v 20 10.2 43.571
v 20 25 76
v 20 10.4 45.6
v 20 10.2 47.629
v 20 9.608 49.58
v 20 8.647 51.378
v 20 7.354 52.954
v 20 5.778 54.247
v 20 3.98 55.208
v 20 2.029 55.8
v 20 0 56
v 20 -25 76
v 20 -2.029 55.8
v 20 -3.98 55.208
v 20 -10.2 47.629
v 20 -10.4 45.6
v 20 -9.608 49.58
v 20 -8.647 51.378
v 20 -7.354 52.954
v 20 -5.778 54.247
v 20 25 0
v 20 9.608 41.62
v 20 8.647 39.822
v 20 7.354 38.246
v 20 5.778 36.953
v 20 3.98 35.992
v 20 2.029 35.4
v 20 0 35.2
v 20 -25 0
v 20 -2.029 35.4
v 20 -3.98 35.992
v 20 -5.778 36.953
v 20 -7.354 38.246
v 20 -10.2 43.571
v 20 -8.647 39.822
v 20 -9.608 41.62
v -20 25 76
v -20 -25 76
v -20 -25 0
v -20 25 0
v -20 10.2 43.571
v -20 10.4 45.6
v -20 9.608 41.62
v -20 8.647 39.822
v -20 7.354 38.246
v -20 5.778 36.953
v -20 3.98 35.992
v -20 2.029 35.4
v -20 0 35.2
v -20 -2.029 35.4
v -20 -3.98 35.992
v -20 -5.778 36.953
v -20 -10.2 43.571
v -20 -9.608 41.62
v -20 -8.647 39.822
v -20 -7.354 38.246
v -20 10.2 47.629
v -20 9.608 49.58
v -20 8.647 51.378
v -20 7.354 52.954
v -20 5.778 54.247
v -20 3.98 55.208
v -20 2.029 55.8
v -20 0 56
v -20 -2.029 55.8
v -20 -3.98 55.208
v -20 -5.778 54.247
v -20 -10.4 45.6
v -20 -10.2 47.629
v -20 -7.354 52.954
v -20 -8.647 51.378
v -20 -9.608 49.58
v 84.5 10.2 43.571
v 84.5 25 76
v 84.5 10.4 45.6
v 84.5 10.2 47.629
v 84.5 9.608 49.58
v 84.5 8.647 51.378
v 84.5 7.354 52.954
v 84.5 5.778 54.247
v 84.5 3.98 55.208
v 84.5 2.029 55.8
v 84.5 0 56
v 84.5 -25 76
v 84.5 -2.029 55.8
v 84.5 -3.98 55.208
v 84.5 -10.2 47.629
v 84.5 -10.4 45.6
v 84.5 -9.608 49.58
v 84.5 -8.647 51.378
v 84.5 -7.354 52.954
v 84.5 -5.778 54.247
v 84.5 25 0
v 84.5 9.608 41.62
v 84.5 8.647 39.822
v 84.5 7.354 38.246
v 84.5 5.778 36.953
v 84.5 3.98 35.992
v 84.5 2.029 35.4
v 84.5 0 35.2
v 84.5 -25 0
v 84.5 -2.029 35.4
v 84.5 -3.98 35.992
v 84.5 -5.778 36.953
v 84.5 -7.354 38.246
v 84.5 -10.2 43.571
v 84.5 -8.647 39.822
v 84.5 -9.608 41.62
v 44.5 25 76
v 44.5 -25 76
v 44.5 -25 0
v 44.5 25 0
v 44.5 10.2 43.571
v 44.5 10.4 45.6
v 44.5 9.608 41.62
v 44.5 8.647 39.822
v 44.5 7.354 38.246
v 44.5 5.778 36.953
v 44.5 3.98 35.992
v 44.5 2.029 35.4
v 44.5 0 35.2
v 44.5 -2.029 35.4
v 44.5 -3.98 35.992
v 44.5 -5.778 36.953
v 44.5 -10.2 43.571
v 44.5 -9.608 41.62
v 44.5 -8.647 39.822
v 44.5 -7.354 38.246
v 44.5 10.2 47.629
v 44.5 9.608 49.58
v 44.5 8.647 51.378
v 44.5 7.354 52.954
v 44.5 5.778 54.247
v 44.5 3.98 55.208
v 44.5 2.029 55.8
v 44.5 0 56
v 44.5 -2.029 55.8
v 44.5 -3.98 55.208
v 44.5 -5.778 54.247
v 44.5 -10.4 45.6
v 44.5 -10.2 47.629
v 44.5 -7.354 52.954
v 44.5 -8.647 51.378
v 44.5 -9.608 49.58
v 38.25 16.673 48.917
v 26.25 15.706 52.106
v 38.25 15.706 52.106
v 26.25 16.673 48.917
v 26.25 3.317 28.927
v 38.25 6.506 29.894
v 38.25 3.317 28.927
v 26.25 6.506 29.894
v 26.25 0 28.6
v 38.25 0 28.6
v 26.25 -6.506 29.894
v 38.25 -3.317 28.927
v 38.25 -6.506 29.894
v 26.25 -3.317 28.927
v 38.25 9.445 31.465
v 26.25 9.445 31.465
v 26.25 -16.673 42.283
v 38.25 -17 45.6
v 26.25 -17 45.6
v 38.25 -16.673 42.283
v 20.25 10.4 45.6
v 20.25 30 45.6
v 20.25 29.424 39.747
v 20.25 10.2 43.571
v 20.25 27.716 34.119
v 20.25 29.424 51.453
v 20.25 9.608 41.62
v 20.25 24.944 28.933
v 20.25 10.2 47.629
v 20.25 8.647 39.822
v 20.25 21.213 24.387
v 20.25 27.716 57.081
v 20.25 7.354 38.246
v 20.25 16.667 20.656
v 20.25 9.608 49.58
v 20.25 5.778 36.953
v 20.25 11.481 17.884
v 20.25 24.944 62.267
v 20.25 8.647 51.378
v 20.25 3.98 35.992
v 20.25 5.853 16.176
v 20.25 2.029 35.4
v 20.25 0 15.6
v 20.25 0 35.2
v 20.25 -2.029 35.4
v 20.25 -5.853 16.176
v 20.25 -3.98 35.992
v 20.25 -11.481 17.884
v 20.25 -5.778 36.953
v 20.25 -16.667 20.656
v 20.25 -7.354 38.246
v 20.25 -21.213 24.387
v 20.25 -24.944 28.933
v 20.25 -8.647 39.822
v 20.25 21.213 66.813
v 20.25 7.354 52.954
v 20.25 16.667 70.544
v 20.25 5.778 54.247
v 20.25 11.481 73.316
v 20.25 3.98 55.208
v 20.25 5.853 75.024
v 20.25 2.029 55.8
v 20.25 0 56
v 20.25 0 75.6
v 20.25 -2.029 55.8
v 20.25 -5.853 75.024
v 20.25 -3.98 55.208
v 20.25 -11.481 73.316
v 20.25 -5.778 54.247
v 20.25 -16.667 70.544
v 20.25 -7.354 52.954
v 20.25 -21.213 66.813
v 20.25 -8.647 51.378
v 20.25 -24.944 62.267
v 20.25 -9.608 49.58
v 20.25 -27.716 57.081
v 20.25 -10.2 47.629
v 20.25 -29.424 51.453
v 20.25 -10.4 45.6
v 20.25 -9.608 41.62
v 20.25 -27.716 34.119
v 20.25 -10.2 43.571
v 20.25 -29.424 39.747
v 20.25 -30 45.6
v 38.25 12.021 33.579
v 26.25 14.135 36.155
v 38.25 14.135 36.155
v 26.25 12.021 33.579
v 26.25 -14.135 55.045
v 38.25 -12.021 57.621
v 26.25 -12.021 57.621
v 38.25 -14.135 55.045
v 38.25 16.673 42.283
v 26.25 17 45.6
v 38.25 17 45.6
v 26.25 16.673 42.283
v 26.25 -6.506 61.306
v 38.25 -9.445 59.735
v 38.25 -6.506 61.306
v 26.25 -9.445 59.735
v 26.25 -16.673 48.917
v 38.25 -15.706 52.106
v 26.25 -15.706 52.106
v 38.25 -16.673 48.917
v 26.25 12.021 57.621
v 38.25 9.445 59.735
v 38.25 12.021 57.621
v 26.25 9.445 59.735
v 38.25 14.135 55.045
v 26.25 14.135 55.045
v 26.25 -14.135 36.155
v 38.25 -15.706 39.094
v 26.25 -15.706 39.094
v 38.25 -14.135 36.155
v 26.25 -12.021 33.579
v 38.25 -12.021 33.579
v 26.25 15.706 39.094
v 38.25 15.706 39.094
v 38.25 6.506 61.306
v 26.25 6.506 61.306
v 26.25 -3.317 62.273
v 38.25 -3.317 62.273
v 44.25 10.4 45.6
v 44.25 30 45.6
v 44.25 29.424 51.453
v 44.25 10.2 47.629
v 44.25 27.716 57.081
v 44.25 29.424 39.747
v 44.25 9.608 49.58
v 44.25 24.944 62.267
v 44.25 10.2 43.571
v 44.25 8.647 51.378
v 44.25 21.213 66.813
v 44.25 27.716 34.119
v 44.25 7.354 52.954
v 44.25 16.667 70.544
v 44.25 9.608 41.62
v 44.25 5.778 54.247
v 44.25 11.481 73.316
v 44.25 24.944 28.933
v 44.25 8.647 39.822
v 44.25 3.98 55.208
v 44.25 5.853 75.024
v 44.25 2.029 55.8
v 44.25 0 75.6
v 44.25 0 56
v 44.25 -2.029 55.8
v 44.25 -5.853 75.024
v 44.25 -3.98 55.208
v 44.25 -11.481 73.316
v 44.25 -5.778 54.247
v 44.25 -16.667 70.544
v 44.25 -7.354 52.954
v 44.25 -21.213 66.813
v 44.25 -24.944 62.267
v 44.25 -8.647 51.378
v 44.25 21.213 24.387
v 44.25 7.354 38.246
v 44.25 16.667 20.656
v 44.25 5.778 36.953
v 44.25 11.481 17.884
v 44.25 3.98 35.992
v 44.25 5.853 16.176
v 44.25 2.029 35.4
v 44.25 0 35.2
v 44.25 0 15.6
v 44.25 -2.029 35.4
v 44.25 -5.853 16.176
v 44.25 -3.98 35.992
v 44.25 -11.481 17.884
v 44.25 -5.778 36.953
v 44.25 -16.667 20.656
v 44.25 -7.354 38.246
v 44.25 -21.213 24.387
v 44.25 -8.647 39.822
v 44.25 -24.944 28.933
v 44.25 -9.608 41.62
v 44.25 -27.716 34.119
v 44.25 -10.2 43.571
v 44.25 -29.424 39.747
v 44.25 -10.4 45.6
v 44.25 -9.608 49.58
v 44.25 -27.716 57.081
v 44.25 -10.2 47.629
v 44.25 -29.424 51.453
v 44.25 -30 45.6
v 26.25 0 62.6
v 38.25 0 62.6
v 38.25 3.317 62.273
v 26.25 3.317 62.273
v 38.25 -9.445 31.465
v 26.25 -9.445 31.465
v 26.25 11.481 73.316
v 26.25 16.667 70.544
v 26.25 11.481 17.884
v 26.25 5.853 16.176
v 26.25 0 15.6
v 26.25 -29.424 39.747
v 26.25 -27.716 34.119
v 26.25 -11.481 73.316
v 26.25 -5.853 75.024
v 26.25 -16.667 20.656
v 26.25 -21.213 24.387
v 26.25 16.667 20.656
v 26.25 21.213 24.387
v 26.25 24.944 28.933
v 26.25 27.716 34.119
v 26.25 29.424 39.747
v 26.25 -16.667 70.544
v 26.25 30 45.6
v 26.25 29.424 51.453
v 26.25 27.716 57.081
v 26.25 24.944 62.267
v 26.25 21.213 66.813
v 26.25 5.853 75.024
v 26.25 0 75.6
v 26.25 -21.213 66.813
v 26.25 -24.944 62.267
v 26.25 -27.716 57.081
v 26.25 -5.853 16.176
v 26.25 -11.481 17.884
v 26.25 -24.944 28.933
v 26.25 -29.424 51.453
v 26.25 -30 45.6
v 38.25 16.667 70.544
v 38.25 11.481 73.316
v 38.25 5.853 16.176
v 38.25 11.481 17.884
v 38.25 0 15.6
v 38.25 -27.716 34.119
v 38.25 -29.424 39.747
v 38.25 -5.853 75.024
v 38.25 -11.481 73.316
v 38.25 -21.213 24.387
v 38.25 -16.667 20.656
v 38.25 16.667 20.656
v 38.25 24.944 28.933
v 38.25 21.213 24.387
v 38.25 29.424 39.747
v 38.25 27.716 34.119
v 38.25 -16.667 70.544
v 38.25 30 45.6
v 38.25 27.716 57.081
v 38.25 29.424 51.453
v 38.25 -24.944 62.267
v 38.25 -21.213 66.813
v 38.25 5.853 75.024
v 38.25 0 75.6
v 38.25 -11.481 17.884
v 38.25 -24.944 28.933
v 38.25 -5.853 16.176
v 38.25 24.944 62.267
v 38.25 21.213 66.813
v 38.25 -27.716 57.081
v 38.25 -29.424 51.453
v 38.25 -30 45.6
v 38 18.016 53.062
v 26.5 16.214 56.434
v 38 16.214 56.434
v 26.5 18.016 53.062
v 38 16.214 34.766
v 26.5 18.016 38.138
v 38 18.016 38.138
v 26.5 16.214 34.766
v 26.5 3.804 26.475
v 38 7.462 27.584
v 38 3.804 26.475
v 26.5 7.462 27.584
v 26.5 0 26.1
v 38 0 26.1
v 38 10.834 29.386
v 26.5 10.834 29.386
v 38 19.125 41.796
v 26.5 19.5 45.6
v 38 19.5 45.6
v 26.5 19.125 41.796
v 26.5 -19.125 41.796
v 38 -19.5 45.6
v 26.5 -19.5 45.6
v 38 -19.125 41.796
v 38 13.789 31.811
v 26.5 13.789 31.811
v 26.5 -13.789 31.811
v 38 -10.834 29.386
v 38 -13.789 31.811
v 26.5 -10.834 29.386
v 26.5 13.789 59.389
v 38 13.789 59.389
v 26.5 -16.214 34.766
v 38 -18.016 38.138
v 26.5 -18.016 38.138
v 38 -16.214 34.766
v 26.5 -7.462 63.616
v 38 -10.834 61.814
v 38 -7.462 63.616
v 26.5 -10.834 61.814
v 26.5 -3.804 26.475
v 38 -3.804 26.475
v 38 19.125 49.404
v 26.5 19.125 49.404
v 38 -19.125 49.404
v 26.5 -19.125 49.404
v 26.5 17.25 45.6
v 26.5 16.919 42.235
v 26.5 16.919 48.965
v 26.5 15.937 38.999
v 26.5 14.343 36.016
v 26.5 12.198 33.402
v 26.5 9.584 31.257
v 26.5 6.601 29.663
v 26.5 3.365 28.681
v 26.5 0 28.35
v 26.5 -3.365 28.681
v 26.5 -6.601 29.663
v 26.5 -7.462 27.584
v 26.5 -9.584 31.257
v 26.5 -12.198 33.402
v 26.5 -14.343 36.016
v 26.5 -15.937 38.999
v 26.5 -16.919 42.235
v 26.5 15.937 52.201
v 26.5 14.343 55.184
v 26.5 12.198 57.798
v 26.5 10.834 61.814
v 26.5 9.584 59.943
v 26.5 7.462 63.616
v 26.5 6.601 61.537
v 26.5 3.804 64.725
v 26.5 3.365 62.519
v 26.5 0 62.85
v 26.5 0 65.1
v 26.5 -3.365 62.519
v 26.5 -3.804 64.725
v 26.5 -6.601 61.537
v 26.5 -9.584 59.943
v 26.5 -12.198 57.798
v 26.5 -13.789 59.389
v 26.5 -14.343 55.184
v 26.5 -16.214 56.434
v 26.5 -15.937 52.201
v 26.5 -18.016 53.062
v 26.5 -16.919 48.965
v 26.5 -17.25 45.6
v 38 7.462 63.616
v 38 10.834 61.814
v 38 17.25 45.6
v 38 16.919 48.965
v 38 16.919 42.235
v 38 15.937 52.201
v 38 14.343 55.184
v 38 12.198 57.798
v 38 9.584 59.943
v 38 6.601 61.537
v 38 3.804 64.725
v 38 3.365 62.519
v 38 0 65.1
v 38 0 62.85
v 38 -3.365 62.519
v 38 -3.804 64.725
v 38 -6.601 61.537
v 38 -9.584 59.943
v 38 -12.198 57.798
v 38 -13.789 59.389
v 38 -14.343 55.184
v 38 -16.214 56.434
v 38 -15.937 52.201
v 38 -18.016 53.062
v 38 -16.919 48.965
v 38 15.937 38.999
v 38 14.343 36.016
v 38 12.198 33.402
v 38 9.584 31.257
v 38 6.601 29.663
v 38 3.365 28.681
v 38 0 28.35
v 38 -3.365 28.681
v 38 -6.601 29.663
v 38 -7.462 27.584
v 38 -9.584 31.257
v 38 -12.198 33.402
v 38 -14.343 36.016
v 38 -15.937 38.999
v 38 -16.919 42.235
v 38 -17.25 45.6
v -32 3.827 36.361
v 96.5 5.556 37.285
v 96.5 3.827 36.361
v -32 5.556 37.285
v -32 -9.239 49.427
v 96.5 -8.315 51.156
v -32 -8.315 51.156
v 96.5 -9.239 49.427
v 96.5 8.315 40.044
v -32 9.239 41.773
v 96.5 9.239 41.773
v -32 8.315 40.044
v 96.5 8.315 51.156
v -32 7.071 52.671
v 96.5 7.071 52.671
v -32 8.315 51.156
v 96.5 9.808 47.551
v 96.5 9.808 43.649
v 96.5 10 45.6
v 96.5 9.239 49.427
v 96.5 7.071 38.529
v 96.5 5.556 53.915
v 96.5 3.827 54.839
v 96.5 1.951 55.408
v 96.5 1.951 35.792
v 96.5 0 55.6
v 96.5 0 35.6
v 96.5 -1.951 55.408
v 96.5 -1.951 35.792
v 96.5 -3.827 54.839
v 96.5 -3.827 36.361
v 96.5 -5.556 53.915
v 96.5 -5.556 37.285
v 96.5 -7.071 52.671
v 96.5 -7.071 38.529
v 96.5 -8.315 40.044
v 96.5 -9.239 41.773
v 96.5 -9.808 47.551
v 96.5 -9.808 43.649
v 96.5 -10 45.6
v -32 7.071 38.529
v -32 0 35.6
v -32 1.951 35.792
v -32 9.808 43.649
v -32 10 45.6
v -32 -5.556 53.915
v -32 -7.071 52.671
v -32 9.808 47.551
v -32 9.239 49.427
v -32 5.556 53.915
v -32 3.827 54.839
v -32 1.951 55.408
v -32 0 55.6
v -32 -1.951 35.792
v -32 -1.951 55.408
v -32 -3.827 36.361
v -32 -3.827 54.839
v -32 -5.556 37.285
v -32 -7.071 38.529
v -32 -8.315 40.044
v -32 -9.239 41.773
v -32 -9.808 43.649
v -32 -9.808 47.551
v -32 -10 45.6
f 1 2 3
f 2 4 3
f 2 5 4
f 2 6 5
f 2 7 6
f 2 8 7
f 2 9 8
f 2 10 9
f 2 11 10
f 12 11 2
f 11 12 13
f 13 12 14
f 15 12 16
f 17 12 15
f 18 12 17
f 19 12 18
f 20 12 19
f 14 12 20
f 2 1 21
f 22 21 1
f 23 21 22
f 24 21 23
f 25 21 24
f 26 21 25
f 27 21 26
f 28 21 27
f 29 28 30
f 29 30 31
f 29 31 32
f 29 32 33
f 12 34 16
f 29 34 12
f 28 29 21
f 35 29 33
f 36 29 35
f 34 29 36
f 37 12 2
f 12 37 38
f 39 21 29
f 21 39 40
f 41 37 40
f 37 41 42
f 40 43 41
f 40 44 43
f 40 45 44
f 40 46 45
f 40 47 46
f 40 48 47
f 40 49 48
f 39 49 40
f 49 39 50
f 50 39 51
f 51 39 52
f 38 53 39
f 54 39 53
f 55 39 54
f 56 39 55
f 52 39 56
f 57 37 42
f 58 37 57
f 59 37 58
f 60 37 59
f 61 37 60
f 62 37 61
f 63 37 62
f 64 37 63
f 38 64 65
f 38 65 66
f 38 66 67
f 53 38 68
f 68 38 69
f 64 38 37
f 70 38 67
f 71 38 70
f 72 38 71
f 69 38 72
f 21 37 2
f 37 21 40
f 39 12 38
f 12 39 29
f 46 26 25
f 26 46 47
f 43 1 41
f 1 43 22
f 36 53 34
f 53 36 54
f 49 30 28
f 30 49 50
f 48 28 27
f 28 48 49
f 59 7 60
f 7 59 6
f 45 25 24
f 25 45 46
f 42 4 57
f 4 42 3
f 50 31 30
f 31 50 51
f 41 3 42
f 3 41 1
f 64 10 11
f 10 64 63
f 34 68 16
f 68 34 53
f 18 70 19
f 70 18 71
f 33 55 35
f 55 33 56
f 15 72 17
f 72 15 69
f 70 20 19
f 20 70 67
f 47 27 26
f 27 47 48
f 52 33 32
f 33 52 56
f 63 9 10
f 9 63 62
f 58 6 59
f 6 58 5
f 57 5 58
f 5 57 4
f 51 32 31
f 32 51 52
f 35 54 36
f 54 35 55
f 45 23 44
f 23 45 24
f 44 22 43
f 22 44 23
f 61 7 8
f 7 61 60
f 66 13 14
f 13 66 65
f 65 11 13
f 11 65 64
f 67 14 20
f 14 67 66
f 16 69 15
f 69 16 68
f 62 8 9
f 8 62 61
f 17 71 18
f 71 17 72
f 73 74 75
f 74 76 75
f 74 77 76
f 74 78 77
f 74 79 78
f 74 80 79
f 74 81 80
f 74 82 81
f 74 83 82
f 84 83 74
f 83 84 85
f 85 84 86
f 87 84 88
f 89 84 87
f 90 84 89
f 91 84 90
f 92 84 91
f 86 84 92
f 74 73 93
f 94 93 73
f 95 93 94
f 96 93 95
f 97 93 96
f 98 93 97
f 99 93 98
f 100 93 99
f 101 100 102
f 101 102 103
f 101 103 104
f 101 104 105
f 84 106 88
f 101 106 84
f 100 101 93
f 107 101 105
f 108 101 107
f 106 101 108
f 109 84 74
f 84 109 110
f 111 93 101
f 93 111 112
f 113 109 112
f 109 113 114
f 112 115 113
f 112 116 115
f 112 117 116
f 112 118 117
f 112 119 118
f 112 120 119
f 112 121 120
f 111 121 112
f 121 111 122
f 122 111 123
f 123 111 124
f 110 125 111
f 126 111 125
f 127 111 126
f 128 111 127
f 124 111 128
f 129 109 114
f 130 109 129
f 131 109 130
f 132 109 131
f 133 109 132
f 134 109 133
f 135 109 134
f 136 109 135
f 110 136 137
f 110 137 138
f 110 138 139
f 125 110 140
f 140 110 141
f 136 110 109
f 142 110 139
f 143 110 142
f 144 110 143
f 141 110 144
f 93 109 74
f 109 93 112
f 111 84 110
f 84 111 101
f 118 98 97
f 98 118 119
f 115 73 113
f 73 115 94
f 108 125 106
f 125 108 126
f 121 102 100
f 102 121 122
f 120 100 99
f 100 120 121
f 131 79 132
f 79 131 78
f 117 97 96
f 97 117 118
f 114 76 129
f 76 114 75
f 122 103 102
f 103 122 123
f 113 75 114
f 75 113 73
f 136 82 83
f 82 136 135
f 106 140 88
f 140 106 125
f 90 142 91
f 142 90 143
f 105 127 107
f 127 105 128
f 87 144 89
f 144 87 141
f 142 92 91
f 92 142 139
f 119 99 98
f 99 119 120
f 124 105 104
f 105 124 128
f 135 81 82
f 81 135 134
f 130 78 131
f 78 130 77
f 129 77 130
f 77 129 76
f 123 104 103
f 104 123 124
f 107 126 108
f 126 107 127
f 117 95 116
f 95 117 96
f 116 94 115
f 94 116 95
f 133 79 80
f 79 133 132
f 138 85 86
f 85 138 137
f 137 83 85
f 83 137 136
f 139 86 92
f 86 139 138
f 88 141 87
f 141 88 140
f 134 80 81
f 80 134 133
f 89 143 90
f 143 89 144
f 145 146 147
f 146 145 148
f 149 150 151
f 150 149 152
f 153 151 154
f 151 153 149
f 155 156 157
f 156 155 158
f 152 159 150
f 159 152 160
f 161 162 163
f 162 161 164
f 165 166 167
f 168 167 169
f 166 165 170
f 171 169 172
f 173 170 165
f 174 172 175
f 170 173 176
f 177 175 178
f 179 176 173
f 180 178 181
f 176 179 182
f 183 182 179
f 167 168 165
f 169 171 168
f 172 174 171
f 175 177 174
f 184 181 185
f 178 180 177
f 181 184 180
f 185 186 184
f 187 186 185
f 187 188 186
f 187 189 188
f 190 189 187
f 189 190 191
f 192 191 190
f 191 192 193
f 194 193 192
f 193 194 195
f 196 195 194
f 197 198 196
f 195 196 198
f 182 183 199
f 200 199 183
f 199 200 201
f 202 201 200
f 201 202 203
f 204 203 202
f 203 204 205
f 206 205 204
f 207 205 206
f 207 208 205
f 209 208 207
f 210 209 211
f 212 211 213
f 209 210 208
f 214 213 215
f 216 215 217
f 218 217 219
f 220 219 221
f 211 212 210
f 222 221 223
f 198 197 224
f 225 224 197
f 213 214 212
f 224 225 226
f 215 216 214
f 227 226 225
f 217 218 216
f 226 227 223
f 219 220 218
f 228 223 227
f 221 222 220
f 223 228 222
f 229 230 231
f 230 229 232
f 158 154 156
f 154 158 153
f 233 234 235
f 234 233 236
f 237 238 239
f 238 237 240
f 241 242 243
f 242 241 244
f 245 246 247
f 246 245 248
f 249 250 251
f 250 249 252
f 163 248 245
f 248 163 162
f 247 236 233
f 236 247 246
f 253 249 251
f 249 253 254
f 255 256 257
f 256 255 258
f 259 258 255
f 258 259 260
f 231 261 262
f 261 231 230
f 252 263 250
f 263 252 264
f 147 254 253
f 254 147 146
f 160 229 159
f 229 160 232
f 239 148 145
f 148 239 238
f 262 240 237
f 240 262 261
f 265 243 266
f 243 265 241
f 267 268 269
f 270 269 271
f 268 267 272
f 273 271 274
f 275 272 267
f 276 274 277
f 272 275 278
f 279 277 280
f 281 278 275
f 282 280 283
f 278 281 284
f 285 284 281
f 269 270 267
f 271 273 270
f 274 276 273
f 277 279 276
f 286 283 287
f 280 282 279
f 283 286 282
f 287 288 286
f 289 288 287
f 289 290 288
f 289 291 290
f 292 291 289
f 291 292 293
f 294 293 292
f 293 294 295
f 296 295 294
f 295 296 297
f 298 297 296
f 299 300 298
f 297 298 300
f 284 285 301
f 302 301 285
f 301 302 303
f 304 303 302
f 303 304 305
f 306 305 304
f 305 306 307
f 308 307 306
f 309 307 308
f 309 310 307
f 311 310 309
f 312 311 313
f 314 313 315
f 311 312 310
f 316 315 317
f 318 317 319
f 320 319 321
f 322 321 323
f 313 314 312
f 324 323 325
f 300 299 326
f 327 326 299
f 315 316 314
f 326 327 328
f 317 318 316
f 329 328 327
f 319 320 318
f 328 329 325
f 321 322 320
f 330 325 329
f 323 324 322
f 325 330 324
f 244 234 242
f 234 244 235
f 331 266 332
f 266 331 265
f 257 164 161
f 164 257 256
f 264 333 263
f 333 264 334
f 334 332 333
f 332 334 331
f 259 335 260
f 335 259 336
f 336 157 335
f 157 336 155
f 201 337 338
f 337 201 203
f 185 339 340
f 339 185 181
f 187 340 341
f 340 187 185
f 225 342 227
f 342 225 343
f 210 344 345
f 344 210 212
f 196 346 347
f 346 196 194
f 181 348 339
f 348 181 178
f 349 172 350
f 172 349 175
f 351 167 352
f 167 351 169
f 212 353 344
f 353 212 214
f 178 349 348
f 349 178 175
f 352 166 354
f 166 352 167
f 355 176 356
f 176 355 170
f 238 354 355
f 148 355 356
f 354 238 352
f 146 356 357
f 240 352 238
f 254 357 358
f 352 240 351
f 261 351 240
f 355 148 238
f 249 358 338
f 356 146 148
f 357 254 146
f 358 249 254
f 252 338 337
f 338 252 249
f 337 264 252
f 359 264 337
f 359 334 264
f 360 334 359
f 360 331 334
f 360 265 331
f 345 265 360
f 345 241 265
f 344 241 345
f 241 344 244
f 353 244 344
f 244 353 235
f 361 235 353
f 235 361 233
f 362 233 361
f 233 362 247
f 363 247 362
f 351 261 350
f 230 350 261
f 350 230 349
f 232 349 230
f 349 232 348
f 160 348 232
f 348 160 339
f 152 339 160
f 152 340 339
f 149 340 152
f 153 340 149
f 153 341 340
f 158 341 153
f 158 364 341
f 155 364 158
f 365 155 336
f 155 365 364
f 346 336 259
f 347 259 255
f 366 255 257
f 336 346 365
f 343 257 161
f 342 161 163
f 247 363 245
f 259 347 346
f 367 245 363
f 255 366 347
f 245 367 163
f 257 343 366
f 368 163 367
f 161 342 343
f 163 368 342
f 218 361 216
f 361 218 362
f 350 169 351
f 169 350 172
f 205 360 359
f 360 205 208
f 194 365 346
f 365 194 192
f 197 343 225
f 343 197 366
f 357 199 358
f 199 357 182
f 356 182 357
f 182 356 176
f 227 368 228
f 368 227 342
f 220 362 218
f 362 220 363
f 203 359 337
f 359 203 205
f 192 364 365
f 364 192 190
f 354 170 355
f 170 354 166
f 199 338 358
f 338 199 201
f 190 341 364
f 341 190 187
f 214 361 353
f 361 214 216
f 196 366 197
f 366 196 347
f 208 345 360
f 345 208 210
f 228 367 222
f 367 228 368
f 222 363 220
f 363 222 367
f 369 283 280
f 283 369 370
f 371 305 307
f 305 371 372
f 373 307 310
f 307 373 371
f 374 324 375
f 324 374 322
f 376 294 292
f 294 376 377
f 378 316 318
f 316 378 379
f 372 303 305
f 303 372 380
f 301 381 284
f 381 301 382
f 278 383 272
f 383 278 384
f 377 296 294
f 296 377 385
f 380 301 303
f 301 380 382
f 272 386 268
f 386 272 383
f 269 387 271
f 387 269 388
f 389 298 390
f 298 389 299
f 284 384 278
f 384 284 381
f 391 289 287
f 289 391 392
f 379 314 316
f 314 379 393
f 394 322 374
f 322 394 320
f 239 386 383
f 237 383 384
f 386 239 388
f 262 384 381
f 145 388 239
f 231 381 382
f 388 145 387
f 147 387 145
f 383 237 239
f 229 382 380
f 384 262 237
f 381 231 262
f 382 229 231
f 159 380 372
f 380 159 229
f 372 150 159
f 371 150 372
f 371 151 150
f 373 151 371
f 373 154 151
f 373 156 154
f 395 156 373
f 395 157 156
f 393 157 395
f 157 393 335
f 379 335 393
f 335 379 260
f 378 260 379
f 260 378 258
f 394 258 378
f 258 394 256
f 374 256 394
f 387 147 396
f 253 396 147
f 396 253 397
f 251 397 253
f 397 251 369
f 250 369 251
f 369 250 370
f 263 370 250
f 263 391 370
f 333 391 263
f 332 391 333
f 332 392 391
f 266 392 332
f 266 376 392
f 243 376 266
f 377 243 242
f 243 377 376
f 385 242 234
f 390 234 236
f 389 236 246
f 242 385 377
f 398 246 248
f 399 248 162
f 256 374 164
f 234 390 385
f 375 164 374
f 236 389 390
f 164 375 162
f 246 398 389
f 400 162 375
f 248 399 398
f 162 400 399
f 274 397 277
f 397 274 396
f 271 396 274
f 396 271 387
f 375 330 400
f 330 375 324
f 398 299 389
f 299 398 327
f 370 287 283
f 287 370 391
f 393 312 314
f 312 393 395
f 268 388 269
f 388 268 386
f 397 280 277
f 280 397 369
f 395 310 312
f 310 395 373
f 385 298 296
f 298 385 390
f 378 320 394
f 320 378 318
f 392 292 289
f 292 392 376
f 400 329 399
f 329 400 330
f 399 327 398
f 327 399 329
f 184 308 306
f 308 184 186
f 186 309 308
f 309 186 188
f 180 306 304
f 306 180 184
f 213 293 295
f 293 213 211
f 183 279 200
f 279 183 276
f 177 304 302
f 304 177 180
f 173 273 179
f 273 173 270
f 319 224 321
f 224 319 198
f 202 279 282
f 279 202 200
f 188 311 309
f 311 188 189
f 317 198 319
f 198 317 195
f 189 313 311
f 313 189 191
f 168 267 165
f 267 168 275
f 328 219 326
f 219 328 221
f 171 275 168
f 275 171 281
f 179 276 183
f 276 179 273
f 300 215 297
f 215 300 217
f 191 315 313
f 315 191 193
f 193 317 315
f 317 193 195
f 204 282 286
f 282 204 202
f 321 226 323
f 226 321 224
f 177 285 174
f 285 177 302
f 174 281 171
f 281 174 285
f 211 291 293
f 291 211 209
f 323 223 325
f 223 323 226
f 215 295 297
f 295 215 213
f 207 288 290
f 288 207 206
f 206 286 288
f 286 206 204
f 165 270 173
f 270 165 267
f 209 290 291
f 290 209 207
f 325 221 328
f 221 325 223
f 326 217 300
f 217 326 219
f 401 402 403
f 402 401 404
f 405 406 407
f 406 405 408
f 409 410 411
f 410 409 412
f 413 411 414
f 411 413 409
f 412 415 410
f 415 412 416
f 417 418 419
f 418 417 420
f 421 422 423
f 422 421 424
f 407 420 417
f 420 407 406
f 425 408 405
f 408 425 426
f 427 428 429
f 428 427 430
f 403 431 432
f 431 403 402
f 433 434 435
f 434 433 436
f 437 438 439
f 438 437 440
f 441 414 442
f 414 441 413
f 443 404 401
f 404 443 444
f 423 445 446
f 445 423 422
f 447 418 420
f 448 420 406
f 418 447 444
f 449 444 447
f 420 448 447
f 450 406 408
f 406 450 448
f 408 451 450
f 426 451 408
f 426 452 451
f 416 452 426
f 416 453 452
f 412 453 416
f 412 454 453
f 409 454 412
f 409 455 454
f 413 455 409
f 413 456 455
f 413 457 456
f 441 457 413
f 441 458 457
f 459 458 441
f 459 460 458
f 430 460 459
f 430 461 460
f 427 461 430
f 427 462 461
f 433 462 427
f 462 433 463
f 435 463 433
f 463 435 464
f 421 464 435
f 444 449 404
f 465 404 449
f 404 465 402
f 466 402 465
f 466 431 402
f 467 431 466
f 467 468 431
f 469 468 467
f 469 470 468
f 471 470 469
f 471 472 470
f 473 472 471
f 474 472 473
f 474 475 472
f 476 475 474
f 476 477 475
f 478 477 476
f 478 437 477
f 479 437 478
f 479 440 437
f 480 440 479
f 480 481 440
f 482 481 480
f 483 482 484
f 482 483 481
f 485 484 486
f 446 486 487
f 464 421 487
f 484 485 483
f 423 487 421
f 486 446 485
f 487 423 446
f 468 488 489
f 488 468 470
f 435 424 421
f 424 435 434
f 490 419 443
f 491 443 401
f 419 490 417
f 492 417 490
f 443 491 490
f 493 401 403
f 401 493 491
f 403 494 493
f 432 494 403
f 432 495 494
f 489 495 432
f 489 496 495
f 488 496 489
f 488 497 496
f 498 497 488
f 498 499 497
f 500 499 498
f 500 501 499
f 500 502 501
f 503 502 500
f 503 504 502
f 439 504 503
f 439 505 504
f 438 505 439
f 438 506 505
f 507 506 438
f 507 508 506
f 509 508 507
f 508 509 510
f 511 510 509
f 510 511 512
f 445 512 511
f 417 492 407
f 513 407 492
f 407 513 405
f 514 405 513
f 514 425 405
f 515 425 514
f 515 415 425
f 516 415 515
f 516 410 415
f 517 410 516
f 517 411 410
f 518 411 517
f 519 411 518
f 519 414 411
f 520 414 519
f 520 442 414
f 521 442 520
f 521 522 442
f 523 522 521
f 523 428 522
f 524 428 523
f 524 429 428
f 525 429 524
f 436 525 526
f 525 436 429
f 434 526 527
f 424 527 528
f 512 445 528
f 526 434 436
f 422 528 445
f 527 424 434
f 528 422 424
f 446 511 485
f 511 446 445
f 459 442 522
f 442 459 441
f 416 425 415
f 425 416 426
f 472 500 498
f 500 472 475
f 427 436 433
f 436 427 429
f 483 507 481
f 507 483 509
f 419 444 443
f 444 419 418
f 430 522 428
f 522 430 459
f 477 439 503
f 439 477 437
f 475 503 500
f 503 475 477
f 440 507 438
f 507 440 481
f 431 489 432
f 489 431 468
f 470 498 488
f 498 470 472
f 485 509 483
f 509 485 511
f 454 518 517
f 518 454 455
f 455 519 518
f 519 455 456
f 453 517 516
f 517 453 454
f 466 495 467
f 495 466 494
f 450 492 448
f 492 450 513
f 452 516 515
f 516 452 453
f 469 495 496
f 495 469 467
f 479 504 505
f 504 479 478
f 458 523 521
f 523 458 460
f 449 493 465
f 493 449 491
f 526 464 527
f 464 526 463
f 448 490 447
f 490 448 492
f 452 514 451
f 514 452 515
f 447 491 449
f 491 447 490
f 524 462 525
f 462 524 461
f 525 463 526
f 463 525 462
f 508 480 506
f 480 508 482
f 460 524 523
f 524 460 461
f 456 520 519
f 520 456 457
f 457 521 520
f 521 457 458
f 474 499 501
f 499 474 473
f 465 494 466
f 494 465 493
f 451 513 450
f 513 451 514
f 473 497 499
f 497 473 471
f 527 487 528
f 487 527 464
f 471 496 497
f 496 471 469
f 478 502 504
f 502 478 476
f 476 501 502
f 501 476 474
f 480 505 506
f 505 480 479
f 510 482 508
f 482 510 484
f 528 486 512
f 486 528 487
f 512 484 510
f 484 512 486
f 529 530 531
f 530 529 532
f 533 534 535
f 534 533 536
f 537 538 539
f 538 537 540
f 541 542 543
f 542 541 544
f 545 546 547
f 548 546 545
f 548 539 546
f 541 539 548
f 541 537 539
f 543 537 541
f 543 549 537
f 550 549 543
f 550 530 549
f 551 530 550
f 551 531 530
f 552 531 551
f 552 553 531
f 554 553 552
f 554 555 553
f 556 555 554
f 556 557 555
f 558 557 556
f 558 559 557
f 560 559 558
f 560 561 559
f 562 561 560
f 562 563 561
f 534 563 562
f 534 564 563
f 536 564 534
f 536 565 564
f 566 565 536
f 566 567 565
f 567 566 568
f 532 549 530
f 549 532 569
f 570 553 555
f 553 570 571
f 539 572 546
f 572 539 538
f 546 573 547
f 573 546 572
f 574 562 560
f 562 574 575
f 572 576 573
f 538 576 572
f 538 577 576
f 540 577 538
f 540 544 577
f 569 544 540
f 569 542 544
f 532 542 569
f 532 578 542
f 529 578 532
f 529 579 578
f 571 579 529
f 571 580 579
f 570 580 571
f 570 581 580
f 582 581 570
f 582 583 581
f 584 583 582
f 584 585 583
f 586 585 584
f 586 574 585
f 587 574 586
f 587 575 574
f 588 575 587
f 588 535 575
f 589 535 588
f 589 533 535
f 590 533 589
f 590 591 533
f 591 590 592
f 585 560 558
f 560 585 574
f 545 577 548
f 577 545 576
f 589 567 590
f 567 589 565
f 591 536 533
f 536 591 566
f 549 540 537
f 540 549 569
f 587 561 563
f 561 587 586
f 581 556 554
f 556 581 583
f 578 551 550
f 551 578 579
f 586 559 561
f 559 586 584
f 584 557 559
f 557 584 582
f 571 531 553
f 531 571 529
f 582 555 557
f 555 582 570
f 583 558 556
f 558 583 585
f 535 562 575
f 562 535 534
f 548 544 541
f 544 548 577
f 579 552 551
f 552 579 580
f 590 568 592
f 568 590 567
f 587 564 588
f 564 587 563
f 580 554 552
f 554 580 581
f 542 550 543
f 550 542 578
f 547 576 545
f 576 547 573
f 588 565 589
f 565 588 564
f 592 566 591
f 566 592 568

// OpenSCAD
$fn = 32;

// ------------------------------------------------------------------------
// Pulley assembly: d60 pulley with a belt, shaft d20
// Every part is its own module, assembly() places them once.
// ------------------------------------------------------------------------

// --- part 1 ---
module support1() {
  difference() {
    translate([-20, -25, 0]) cube([40, 50, 76]);
    translate([0, 0, 45.6]) rotate([0, 90, 0]) cylinder(h = 42, d = 20.8, center = true);
  }
}

// --- part 2 ---
module support2() {
  difference() {
    translate([-20, -25, 0]) cube([40, 50, 76]);
    translate([0, 0, 45.6]) rotate([0, 90, 0]) cylinder(h = 42, d = 20.8, center = true);
  }
}

// --- part 3 ---
module shaft() {
  translate([0, 0, -64.25]) cylinder(h = 128.5, d = 20);
}

// --- part 4 ---
module pulley() {
  difference() {
    union() {
      cylinder(h = 24, d = 34);
      cylinder(h = 6, d = 60);
      translate([0, 0, 18]) cylinder(h = 6, d = 60);
    }
    translate([0, 0, -1]) cylinder(h = 26, d = 20.8);
  }
}

// --- part 5 ---
module belt() {
  difference() {
      translate([0, 0, 0]) cylinder(h = 11.5, d = 39);
      translate([0, 0, -1]) cylinder(h = 13.5, d = 34.5);
    }
}

// --- assembly ---
module assembly() {
  translate([0, 0, 0]) rotate([0, 0, 0]) support1();
  translate([64.5, 0, 0]) rotate([0, 0, 0]) support2();
  translate([32.25, 0, 45.6]) rotate([0, 90, 0]) shaft();
  translate([20.25, 0, 45.6]) rotate([0, 90, 0]) pulley();
  translate([26.5, 0, 45.6]) rotate([0, 90, 0]) belt();
}

assembly();
